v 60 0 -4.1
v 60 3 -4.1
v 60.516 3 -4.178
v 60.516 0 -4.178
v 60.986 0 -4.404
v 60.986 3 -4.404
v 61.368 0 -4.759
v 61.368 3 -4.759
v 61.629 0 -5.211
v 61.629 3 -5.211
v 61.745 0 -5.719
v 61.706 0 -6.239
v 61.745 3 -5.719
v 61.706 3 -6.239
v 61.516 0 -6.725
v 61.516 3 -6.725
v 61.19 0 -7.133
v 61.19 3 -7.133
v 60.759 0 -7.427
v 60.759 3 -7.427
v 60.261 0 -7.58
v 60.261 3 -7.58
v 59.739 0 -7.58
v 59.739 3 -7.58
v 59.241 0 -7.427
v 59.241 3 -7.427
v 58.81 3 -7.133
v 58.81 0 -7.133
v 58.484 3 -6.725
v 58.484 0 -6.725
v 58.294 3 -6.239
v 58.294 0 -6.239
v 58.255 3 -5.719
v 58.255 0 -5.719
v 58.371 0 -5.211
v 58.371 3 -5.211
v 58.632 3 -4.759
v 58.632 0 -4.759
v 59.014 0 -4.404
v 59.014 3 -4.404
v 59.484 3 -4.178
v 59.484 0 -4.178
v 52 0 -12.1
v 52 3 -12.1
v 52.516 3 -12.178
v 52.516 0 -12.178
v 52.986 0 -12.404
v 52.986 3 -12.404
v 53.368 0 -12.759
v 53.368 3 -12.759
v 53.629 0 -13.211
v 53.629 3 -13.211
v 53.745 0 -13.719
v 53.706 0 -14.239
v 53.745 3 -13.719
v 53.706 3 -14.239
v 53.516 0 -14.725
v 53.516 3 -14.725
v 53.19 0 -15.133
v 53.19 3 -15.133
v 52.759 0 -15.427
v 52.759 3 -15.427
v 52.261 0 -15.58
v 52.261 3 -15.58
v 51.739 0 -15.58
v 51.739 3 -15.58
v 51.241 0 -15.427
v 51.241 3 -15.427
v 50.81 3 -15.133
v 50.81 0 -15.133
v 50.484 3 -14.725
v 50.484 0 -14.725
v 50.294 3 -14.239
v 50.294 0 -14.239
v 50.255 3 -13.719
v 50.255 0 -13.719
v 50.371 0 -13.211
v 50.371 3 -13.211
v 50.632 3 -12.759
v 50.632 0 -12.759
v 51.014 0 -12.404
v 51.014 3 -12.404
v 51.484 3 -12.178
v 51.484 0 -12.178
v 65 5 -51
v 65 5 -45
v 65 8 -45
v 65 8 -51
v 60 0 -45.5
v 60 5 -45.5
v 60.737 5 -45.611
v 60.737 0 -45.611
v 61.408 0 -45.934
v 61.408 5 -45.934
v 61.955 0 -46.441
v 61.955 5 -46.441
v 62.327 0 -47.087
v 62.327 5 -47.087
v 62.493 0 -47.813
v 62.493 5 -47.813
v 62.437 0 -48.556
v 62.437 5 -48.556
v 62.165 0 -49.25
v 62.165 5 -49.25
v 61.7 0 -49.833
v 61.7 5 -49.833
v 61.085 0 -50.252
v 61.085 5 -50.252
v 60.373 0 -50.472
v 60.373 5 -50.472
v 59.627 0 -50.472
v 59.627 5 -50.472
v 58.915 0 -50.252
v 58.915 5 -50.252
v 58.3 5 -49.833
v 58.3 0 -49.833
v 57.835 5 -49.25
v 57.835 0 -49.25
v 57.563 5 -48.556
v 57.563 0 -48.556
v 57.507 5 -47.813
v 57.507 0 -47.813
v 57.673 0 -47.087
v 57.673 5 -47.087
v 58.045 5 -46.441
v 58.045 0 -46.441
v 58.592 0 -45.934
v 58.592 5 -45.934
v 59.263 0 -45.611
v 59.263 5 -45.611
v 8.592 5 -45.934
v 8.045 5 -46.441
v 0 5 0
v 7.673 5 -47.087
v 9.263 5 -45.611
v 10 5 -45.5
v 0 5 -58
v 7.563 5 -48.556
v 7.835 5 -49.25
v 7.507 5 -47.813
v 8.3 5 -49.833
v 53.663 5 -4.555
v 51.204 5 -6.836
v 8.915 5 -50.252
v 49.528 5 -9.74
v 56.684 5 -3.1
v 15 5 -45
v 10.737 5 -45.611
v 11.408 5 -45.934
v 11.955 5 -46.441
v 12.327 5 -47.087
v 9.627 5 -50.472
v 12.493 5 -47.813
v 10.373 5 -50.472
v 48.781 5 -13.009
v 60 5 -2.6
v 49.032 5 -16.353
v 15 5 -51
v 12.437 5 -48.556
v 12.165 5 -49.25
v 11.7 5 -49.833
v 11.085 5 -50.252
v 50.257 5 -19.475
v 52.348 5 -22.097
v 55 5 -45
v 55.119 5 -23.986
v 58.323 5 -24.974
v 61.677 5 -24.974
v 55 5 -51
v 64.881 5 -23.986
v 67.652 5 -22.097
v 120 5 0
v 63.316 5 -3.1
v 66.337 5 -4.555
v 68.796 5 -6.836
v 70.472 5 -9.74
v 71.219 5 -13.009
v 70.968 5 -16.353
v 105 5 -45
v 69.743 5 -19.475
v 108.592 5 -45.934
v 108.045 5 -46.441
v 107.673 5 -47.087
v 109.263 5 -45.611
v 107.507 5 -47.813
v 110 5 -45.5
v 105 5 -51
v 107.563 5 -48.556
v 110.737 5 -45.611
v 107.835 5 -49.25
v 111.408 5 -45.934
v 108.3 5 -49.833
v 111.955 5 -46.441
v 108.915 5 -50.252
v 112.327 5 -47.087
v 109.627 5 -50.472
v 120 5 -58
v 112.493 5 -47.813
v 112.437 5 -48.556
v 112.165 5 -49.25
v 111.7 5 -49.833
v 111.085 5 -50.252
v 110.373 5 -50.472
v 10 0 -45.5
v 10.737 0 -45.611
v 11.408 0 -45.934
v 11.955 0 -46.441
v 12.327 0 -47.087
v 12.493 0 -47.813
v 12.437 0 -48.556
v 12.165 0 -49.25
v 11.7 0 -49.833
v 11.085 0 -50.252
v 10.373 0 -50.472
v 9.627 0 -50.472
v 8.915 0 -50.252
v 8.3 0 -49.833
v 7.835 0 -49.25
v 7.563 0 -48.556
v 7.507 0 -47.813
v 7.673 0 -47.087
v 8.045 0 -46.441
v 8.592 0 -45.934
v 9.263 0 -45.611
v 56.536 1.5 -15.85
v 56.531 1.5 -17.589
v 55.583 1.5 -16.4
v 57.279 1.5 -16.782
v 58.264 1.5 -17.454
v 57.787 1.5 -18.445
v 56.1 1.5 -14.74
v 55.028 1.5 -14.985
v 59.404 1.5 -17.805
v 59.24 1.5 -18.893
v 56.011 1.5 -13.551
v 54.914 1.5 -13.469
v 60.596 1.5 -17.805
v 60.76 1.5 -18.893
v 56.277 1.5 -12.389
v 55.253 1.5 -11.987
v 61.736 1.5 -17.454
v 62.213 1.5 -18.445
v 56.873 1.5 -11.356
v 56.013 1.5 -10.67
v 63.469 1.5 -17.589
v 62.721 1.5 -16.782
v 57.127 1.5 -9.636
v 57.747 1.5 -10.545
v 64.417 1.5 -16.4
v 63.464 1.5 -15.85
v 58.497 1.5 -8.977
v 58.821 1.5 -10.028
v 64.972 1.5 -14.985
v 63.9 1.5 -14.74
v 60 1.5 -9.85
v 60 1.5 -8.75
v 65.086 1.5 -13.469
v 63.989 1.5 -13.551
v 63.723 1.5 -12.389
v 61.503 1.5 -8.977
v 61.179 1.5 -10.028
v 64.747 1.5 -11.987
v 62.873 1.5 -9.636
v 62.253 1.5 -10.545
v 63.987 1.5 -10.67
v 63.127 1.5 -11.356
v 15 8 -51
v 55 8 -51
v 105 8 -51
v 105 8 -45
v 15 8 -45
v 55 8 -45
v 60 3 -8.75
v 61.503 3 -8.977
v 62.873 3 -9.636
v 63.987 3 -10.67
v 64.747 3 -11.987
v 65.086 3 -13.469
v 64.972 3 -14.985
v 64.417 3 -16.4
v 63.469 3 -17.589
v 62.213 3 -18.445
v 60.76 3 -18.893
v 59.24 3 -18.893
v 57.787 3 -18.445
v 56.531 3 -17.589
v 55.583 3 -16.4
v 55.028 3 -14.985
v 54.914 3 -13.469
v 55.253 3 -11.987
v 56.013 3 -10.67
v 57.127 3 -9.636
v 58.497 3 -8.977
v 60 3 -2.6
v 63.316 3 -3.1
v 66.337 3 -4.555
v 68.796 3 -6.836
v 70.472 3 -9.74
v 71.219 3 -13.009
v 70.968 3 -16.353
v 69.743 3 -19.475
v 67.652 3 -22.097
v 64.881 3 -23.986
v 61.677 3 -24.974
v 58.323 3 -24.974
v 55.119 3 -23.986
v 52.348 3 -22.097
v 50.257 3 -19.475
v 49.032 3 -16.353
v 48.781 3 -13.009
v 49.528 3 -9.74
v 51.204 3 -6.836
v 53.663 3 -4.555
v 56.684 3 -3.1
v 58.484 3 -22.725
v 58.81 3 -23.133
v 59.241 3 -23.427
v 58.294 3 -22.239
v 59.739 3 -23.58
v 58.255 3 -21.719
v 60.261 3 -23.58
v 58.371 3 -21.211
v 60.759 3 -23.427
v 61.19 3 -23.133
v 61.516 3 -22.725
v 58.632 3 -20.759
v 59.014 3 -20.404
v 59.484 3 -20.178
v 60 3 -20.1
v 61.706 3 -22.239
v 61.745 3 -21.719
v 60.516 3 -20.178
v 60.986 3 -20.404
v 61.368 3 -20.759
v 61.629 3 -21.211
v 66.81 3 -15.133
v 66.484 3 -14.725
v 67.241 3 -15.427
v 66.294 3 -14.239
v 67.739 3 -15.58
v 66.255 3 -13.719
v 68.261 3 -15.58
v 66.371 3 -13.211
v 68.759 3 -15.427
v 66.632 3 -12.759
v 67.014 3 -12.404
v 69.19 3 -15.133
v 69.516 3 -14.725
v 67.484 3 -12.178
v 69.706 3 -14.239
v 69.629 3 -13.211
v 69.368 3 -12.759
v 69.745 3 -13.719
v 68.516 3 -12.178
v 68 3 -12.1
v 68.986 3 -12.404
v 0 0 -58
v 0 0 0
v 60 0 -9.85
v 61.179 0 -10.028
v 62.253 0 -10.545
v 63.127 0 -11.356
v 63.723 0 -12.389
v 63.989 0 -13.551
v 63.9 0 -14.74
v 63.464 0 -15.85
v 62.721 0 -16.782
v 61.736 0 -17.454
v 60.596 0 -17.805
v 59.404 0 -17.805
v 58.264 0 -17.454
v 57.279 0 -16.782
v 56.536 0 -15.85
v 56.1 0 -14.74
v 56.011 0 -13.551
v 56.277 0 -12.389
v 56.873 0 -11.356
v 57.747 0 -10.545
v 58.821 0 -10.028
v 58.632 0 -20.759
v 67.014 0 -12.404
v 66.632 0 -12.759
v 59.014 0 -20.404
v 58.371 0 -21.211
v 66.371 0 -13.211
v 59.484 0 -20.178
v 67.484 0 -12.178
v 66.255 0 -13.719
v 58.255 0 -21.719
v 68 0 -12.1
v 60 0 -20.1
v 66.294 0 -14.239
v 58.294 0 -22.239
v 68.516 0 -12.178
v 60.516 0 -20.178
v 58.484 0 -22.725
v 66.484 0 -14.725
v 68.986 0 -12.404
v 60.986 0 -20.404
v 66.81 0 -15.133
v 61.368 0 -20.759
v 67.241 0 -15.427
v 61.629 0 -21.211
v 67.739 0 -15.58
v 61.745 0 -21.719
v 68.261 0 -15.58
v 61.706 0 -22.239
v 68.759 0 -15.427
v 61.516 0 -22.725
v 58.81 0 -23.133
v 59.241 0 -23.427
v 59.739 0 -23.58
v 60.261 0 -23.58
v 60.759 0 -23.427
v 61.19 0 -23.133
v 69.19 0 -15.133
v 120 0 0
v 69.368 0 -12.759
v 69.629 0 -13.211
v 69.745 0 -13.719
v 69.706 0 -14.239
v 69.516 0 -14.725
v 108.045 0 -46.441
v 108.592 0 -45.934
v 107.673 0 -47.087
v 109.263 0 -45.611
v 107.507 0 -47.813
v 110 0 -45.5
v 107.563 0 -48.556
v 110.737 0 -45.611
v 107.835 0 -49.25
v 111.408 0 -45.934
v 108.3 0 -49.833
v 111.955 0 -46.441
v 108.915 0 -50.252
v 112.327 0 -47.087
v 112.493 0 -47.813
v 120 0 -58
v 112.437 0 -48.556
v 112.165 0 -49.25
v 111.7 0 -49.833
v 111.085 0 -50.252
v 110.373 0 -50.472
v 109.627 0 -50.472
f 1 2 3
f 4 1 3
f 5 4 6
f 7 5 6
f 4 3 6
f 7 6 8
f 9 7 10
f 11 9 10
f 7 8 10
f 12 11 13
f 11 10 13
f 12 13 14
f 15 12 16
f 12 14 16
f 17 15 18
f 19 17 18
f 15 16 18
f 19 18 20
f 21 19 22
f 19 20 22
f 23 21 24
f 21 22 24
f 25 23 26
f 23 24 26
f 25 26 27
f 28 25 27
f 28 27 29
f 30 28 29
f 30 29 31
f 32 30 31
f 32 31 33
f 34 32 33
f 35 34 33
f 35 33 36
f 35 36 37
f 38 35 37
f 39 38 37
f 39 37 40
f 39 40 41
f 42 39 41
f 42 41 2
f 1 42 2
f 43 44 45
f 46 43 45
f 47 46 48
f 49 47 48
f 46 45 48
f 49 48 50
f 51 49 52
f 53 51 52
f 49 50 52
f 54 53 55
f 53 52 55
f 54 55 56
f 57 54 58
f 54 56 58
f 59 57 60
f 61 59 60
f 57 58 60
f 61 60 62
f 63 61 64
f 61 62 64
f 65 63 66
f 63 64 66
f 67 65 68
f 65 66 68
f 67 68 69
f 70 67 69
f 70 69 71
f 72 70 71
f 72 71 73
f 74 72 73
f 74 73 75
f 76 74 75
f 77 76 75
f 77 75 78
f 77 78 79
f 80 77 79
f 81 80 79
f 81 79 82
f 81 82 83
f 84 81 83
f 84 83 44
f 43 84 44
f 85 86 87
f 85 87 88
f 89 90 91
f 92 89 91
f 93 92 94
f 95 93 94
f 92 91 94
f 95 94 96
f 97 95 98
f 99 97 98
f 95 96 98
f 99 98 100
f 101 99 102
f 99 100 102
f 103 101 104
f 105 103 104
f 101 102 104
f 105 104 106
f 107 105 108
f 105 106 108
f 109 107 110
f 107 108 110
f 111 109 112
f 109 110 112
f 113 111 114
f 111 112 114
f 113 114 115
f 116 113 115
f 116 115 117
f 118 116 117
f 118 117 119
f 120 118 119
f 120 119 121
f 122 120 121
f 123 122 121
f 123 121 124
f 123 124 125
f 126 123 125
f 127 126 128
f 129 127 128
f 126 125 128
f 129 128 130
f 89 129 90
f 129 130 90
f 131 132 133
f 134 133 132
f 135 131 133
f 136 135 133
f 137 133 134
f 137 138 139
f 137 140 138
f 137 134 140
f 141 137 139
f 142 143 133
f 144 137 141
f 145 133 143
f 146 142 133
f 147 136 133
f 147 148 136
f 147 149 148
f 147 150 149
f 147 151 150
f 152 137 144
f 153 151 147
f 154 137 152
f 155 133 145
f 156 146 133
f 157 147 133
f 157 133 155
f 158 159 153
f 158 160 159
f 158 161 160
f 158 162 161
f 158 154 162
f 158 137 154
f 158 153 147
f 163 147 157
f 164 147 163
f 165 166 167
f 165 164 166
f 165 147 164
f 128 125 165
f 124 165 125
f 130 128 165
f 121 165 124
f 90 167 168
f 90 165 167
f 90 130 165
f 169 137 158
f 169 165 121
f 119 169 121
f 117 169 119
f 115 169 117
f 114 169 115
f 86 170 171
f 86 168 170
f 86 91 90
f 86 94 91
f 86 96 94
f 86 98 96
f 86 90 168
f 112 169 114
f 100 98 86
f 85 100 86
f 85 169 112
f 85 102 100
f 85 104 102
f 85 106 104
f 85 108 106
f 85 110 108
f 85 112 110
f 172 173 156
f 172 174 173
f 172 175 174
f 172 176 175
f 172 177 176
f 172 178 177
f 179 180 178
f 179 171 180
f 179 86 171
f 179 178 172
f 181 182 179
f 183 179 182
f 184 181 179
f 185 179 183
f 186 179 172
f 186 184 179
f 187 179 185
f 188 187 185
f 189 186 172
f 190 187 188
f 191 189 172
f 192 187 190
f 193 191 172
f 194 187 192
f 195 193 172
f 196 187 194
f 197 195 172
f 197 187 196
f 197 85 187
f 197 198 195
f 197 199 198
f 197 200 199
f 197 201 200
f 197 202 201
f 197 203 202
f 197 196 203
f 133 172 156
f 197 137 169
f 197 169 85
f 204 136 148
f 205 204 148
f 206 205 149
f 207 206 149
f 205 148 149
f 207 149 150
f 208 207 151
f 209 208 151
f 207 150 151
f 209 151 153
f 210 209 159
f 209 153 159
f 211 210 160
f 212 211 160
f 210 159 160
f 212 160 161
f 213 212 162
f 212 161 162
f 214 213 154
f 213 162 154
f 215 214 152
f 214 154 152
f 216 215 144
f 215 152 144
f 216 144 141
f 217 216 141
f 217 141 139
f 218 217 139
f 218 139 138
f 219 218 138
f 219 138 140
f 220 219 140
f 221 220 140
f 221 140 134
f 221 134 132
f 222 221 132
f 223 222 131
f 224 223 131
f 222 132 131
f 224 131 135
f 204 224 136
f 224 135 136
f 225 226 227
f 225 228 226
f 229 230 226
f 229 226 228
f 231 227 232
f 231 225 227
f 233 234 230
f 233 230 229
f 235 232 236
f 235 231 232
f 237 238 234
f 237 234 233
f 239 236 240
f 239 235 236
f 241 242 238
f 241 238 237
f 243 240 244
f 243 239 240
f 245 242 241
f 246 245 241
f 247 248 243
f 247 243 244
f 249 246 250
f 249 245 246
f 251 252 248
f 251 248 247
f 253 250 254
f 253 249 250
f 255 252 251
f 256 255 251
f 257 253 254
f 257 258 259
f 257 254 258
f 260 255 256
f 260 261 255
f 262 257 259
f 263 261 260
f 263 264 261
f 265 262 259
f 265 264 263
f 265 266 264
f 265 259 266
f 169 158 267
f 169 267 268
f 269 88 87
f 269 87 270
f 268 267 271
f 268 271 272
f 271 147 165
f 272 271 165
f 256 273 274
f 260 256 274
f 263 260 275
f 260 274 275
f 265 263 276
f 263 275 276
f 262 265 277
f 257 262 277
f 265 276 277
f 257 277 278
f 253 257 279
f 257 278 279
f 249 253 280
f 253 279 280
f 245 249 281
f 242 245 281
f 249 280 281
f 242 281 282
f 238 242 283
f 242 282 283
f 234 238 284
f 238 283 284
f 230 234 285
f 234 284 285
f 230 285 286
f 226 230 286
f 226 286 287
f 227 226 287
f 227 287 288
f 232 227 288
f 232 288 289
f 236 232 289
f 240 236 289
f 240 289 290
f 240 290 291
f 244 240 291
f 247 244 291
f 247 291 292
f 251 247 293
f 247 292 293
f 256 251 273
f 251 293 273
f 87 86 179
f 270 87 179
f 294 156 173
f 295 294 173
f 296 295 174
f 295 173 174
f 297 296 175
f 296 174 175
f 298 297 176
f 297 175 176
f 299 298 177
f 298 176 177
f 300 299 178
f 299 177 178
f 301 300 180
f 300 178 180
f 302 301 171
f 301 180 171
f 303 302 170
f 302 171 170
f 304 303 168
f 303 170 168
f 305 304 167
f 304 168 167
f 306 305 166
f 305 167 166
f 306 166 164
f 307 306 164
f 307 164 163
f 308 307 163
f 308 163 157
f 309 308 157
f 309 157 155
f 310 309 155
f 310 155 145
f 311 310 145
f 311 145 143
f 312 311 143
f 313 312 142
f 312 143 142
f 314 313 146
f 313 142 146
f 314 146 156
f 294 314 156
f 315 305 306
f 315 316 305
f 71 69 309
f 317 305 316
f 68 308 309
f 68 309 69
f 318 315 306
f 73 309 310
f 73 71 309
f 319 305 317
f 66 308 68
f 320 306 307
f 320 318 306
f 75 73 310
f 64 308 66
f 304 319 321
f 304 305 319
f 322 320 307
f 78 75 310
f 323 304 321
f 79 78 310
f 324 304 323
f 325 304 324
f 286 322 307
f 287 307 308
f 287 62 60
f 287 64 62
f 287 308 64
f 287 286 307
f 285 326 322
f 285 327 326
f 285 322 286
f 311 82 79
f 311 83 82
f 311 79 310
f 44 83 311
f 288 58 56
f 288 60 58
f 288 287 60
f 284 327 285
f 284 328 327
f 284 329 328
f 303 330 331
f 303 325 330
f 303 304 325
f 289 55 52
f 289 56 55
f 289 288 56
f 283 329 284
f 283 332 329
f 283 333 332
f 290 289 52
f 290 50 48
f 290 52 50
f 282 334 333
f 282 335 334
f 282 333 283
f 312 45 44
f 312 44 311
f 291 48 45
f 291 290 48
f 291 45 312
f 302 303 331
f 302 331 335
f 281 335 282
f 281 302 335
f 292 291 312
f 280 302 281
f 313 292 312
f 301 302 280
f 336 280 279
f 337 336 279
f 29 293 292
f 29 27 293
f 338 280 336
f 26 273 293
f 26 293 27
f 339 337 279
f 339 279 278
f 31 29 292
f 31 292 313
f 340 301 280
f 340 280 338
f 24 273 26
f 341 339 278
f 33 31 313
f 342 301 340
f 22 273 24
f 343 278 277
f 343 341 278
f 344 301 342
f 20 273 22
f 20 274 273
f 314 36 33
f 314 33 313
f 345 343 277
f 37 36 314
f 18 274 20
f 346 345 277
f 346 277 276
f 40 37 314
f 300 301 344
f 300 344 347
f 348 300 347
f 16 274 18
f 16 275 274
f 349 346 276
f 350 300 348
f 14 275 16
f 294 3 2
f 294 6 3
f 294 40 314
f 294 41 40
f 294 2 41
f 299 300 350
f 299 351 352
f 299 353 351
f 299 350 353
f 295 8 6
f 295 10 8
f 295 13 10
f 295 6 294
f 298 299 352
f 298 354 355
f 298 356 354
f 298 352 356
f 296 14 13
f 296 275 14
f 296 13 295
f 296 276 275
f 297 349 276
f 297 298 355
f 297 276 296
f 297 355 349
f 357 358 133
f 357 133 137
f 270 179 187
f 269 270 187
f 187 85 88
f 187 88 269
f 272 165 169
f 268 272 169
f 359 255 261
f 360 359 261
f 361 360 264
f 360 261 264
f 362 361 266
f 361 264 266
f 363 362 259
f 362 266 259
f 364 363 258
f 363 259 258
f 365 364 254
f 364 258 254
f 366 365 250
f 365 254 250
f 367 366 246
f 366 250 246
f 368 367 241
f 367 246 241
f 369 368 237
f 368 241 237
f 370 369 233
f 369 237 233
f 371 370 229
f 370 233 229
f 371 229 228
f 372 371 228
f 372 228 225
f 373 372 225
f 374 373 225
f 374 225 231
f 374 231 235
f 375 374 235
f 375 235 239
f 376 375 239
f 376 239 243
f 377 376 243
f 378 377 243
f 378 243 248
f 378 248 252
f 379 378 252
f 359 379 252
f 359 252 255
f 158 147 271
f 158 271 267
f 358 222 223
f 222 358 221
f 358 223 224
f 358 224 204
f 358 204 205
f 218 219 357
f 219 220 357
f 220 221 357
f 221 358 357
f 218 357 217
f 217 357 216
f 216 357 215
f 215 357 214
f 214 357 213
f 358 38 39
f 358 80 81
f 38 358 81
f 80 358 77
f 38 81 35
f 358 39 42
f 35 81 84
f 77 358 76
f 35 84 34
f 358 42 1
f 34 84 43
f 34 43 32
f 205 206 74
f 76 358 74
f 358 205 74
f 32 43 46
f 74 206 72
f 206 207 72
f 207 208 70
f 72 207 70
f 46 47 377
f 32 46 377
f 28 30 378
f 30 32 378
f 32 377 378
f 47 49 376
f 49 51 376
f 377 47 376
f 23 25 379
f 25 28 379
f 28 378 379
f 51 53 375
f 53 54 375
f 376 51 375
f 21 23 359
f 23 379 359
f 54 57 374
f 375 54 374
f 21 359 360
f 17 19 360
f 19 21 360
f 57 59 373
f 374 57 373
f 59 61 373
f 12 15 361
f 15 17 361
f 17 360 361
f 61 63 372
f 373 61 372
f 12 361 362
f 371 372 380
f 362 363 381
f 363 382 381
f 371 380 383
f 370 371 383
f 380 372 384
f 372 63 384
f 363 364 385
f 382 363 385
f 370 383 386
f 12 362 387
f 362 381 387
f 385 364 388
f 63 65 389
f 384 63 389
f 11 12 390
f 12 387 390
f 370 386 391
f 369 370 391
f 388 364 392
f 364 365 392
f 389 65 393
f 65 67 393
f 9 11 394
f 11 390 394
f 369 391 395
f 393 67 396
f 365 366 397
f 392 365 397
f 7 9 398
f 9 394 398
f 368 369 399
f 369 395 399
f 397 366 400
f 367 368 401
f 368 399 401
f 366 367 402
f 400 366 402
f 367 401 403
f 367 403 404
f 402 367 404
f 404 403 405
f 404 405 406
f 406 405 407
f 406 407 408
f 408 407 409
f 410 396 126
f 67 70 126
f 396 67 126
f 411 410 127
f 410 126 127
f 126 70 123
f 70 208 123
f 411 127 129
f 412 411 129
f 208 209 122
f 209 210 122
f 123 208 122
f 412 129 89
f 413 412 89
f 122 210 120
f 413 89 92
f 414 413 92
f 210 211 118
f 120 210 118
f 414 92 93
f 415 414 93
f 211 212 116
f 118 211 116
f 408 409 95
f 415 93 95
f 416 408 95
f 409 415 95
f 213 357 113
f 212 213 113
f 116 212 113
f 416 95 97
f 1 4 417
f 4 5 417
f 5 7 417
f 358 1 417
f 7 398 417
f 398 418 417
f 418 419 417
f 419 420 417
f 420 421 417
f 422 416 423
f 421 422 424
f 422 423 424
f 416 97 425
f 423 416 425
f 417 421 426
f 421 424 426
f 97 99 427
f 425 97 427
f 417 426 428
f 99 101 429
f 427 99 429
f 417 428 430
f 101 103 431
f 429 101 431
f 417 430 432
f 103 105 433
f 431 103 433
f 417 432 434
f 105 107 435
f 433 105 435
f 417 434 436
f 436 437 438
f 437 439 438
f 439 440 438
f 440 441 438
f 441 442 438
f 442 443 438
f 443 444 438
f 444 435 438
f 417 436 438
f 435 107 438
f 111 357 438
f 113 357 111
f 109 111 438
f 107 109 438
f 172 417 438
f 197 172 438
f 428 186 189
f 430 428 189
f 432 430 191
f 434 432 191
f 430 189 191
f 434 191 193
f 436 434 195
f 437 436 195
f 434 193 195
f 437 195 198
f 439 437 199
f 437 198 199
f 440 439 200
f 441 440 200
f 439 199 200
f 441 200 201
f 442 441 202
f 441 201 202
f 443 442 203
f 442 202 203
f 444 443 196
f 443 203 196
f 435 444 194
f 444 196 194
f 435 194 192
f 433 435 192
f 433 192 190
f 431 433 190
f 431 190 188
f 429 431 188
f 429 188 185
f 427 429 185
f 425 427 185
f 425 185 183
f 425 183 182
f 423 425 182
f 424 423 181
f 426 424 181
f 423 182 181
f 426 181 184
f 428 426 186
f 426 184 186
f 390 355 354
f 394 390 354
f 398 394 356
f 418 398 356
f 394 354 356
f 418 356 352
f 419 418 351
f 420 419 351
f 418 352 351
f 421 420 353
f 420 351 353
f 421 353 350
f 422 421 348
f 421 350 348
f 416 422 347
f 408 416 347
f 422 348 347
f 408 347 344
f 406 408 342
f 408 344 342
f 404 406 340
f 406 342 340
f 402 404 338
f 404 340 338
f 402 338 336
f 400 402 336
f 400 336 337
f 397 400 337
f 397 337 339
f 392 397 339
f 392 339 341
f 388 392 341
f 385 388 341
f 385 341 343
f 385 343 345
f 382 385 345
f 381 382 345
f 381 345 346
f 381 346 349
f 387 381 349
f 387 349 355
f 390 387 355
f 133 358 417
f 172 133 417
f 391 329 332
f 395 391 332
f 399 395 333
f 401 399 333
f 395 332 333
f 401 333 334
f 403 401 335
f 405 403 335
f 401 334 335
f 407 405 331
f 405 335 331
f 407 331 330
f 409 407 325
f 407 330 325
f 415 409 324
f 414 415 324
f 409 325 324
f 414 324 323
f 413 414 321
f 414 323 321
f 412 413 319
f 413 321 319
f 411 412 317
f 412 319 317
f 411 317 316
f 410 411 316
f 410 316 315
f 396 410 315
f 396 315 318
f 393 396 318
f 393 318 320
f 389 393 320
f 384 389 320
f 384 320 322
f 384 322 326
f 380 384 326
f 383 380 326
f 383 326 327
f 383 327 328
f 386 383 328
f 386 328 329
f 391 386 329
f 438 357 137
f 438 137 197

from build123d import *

# Parameters (mm, degrees)
SKETCH1_W           = 120
SKETCH1_H           = 58
BOSS_EXTRUDE5_DEPTH = 5
SKETCH5_R           = 2.5
CUT_EXTRUDE2_DEPTH  = 5
SKETCH6_W           = 40
SKETCH6_H           = 6
BOSS_EXTRUDE6_DEPTH = 3
SKETCH7_R           = 11.25
CUT_EXTRUDE3_DEPTH  = 2
SKETCH8_R           = 4
CUT_EXTRUDE4_DEPTH  = 12
SKETCH9_R           = 5.1
CUT_EXTRUDE5_DEPTH  = 1.5
SKETCH10_R          = 1.75
CUT_EXTRUDE6_DEPTH  = 21.5


with BuildPart() as part:
    # Sketch1 → Boss-Extrude5 (new body)
    with BuildSketch(Plane(origin=(0, 0, 0), x_dir=(1, 0, 0), z_dir=(0, 1, 0))):
        with Locations((60, 29)):
            Rectangle(SKETCH1_W, SKETCH1_H)
    extrude(amount=BOSS_EXTRUDE5_DEPTH)

    # Sketch5 → Cut-Extrude2 (cut)
    with BuildSketch(Plane(origin=(0, 5, 0), x_dir=(1, 0, 0), z_dir=(0, 1, 0))):
        with Locations(Location((10, 48, 0), (0, 0, 270))):
            Circle(SKETCH5_R)
        with Locations(Location((60, 48, 0), (0, 0, 270))):
            Circle(SKETCH5_R)
        with Locations(Location((110, 48, 0), (0, 0, 270))):
            Circle(SKETCH5_R)
    extrude(amount=-CUT_EXTRUDE2_DEPTH, mode=Mode.SUBTRACT)

    # Sketch6 → Boss-Extrude6 (add)
    with BuildSketch(Plane(origin=(0, 5, 0), x_dir=(1, 0, 0), z_dir=(0, 1, 0))):
        with Locations((35, 48)):
            Rectangle(SKETCH6_W, SKETCH6_H)
        with Locations((85, 48)):
            Rectangle(SKETCH6_W, SKETCH6_H)
    extrude(amount=BOSS_EXTRUDE6_DEPTH)

    # Sketch7 → Cut-Extrude3 (cut)
    with BuildSketch(Plane(origin=(0, 5, 0), x_dir=(1, 0, 0), z_dir=(0, 1, 0))):
        with Locations(Location((60, 13.85, 0), (0, 0, 270))):
            Circle(SKETCH7_R)
    extrude(amount=-CUT_EXTRUDE3_DEPTH, mode=Mode.SUBTRACT)

    # Sketch8 → Cut-Extrude4 (cut)
    with BuildSketch(Plane(origin=(0, 3, 0), x_dir=(1, 0, 0), z_dir=(0, 1, 0))):
        with Locations(Location((60, 13.85, 0), (0, 0, 270))):
            Circle(SKETCH8_R)
    extrude(amount=-CUT_EXTRUDE4_DEPTH, mode=Mode.SUBTRACT)

    # Sketch9 → Cut-Extrude5 (cut)
    with BuildSketch(Plane(origin=(0, 3, 0), x_dir=(1, 0, 0), z_dir=(0, 1, 0))):
        with Locations(Location((60, 13.85, 0), (0, 0, 270))):
            Circle(SKETCH9_R)
    extrude(amount=-CUT_EXTRUDE5_DEPTH, mode=Mode.SUBTRACT)

    # Sketch10 → Cut-Extrude6 (cut)
    with BuildSketch(Plane(origin=(0, 3, 0), x_dir=(1, 0, 0), z_dir=(0, 1, 0))):
        with Locations(Location((52, 13.85, 0), (0, 0, 270))):
            Circle(SKETCH10_R)
        with Locations(Location((60, 21.85, 0), (0, 0, 270))):
            Circle(SKETCH10_R)
        with Locations(Location((68, 13.85, 0), (0, 0, 270))):
            Circle(SKETCH10_R)
        with Locations(Location((60, 5.85, 0), (0, 0, 270))):
            Circle(SKETCH10_R)
    extrude(amount=-CUT_EXTRUDE6_DEPTH, mode=Mode.SUBTRACT)


solid = part.part
